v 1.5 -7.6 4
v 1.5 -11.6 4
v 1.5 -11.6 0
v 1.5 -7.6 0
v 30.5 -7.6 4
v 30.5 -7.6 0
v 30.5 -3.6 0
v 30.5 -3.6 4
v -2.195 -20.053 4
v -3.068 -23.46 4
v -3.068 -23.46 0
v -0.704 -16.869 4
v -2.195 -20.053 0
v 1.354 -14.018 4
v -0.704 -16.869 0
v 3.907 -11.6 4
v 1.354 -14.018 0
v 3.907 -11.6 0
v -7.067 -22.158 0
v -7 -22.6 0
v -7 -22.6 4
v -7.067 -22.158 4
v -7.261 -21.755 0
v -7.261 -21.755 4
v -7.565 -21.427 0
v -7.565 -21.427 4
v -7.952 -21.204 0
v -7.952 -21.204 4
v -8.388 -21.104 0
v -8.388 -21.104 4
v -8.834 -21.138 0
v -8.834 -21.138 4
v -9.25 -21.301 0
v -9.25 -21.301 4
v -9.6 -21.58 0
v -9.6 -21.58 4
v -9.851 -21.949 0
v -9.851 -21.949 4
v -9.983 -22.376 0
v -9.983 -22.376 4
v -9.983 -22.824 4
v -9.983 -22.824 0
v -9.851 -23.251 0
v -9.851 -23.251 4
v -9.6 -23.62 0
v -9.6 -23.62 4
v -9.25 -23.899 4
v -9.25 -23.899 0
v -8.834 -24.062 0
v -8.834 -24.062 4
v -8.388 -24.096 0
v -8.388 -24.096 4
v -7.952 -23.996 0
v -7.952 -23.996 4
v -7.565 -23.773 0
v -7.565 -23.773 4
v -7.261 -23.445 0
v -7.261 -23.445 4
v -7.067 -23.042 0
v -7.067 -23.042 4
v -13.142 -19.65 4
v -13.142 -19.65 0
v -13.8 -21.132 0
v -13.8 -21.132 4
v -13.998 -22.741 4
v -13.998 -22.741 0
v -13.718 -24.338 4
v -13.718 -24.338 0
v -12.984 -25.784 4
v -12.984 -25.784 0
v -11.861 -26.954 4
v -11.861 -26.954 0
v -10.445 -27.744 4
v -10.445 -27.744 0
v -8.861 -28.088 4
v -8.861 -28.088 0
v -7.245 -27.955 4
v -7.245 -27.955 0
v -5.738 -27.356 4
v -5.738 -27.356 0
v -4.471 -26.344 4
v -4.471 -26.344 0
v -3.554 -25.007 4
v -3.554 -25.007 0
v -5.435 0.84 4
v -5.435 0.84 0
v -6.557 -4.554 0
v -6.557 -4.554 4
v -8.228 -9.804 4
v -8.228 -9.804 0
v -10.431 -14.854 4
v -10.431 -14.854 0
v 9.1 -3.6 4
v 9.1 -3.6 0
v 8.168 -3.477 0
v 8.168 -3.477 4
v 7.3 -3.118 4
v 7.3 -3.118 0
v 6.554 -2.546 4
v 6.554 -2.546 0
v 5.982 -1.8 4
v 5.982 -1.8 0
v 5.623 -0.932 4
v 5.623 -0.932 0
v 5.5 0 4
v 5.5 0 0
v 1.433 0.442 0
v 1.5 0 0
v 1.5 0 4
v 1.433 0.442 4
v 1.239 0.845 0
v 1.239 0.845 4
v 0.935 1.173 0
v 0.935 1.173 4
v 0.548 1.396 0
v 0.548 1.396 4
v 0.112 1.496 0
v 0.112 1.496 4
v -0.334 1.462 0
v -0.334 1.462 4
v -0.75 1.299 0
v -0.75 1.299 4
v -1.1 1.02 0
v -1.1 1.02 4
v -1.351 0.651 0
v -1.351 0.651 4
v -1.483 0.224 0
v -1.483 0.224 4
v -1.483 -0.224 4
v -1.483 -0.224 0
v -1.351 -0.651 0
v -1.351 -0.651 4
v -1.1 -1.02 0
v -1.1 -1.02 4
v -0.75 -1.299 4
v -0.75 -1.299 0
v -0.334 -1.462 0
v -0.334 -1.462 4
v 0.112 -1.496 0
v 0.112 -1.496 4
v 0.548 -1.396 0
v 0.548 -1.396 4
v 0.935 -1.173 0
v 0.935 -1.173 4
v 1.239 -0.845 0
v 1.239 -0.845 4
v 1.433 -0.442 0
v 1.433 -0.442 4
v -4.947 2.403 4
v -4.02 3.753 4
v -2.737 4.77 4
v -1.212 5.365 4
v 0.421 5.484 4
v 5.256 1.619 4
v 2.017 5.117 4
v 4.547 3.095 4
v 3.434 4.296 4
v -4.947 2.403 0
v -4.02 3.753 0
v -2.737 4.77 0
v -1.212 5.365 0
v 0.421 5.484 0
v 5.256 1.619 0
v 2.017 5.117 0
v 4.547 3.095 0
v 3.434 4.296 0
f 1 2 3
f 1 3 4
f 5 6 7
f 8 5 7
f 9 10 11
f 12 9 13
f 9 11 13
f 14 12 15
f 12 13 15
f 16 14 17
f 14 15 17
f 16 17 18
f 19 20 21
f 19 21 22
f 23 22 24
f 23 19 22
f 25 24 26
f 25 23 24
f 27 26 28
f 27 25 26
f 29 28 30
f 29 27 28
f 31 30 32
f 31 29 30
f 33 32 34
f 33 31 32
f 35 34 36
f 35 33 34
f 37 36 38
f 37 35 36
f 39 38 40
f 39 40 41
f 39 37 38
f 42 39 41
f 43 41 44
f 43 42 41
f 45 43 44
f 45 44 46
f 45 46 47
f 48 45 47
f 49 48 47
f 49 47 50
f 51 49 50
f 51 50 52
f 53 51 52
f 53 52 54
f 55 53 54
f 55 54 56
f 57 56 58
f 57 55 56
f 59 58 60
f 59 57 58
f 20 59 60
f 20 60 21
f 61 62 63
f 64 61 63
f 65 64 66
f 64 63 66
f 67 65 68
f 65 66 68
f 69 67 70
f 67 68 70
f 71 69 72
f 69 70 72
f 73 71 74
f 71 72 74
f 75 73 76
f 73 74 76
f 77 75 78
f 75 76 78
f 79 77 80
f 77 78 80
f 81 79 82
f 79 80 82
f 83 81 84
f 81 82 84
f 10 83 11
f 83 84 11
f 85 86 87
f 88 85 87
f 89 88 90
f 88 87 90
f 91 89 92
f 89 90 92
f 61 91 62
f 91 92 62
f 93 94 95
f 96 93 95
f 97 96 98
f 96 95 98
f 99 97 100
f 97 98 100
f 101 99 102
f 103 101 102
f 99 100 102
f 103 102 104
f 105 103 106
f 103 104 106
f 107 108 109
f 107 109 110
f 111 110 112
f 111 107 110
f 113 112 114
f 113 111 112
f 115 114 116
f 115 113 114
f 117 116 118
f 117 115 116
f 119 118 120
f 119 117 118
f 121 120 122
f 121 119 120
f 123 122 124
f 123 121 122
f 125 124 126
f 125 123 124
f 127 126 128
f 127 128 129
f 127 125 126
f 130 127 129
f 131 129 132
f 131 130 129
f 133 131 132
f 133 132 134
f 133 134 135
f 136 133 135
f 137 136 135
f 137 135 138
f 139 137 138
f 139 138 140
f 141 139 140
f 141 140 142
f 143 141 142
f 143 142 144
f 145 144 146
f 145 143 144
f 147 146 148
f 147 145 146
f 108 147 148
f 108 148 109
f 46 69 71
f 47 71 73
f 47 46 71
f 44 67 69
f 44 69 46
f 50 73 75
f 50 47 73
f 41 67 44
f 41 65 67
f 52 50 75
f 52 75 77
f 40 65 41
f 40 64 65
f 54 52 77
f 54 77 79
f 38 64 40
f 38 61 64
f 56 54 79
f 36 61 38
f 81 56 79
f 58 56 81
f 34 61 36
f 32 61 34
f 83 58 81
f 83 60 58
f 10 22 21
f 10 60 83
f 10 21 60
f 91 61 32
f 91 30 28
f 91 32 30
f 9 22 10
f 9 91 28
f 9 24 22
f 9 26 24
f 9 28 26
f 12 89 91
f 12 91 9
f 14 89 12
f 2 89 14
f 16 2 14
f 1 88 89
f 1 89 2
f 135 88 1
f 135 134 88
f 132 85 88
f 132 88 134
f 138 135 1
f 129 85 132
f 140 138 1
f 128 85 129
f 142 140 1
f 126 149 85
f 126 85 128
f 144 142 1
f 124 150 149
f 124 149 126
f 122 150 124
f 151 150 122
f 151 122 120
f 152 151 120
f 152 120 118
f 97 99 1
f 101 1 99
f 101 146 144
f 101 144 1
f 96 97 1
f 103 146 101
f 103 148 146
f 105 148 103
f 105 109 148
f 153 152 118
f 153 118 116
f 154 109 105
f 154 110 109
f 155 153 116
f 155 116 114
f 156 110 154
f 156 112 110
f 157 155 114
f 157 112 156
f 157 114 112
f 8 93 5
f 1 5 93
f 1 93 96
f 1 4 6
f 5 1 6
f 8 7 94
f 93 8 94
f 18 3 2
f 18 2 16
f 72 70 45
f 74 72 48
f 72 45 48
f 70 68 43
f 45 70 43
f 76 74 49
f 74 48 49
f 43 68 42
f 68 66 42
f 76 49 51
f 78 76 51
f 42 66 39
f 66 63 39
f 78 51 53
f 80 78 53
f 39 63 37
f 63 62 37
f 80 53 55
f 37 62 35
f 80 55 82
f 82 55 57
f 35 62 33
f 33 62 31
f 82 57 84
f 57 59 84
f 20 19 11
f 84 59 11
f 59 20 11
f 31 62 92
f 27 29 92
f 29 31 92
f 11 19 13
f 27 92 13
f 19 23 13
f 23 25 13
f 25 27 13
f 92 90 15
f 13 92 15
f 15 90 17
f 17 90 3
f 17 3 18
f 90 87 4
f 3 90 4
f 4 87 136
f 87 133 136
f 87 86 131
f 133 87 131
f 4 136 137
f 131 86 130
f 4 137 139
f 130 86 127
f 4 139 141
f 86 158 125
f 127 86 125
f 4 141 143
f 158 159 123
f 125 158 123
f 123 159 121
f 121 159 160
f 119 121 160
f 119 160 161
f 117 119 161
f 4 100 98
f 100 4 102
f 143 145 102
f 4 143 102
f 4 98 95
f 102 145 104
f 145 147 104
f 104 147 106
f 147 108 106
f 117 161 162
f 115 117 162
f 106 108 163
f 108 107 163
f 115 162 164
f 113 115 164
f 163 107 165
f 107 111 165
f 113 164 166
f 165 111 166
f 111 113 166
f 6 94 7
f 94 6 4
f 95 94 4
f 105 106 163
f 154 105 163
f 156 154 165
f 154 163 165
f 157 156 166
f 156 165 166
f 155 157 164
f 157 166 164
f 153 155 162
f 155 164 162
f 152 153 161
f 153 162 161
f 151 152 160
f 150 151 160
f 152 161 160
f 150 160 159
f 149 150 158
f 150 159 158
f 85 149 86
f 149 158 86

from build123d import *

# Parameters (mm, degrees)
SKETCH1_R           = 1.5
BOSS_EXTRUDE1_DEPTH = 4
SKETCH2_W           = 29
SKETCH2_H           = 4
CUT_EXTRUDE1_DEPTH  = 10


with BuildPart() as part:
    # Sketch1 → Boss-Extrude1 (new body)
    with BuildSketch(Plane.XY):
        with BuildLine():
            Line((30.5, -3.6), (9.1, -3.6))
            ThreePointArc((9.1, -3.6), (6.554415588, -2.545584412), (5.5, 0))
            ThreePointArc((5.5, 0), (0.421431882, 5.483830337), (-5.435416425, 0.840385797))
            ThreePointArc((-5.435416425, 0.840385797), (-8.227950432, -9.8038682), (-13.142048472, -19.650188822))
            ThreePointArc((-13.142048472, -19.650188822), (-10.445387128, -27.744460023), (-3.067628607, -23.459849435))
            ThreePointArc((-3.067628607, -23.459849435), (3.290458074, -12.104682623), (15.5, -7.6))
            Line((15.5, -7.6), (30.5, -7.6))
            Line((30.5, -7.6), (30.5, -3.6))
        make_face()
        Circle(SKETCH1_R, mode=Mode.SUBTRACT)
        with Locations((-8.5, -22.6)):
            Circle(SKETCH1_R, mode=Mode.SUBTRACT)
    extrude(amount=BOSS_EXTRUDE1_DEPTH)

    # Sketch2 → Cut-Extrude1 (cut)
    with BuildSketch(Plane.XY.offset(4)):
        with Locations((16, -9.6)):
            Rectangle(SKETCH2_W, SKETCH2_H)
    extrude(amount=-CUT_EXTRUDE1_DEPTH, mode=Mode.SUBTRACT)


solid = part.part
